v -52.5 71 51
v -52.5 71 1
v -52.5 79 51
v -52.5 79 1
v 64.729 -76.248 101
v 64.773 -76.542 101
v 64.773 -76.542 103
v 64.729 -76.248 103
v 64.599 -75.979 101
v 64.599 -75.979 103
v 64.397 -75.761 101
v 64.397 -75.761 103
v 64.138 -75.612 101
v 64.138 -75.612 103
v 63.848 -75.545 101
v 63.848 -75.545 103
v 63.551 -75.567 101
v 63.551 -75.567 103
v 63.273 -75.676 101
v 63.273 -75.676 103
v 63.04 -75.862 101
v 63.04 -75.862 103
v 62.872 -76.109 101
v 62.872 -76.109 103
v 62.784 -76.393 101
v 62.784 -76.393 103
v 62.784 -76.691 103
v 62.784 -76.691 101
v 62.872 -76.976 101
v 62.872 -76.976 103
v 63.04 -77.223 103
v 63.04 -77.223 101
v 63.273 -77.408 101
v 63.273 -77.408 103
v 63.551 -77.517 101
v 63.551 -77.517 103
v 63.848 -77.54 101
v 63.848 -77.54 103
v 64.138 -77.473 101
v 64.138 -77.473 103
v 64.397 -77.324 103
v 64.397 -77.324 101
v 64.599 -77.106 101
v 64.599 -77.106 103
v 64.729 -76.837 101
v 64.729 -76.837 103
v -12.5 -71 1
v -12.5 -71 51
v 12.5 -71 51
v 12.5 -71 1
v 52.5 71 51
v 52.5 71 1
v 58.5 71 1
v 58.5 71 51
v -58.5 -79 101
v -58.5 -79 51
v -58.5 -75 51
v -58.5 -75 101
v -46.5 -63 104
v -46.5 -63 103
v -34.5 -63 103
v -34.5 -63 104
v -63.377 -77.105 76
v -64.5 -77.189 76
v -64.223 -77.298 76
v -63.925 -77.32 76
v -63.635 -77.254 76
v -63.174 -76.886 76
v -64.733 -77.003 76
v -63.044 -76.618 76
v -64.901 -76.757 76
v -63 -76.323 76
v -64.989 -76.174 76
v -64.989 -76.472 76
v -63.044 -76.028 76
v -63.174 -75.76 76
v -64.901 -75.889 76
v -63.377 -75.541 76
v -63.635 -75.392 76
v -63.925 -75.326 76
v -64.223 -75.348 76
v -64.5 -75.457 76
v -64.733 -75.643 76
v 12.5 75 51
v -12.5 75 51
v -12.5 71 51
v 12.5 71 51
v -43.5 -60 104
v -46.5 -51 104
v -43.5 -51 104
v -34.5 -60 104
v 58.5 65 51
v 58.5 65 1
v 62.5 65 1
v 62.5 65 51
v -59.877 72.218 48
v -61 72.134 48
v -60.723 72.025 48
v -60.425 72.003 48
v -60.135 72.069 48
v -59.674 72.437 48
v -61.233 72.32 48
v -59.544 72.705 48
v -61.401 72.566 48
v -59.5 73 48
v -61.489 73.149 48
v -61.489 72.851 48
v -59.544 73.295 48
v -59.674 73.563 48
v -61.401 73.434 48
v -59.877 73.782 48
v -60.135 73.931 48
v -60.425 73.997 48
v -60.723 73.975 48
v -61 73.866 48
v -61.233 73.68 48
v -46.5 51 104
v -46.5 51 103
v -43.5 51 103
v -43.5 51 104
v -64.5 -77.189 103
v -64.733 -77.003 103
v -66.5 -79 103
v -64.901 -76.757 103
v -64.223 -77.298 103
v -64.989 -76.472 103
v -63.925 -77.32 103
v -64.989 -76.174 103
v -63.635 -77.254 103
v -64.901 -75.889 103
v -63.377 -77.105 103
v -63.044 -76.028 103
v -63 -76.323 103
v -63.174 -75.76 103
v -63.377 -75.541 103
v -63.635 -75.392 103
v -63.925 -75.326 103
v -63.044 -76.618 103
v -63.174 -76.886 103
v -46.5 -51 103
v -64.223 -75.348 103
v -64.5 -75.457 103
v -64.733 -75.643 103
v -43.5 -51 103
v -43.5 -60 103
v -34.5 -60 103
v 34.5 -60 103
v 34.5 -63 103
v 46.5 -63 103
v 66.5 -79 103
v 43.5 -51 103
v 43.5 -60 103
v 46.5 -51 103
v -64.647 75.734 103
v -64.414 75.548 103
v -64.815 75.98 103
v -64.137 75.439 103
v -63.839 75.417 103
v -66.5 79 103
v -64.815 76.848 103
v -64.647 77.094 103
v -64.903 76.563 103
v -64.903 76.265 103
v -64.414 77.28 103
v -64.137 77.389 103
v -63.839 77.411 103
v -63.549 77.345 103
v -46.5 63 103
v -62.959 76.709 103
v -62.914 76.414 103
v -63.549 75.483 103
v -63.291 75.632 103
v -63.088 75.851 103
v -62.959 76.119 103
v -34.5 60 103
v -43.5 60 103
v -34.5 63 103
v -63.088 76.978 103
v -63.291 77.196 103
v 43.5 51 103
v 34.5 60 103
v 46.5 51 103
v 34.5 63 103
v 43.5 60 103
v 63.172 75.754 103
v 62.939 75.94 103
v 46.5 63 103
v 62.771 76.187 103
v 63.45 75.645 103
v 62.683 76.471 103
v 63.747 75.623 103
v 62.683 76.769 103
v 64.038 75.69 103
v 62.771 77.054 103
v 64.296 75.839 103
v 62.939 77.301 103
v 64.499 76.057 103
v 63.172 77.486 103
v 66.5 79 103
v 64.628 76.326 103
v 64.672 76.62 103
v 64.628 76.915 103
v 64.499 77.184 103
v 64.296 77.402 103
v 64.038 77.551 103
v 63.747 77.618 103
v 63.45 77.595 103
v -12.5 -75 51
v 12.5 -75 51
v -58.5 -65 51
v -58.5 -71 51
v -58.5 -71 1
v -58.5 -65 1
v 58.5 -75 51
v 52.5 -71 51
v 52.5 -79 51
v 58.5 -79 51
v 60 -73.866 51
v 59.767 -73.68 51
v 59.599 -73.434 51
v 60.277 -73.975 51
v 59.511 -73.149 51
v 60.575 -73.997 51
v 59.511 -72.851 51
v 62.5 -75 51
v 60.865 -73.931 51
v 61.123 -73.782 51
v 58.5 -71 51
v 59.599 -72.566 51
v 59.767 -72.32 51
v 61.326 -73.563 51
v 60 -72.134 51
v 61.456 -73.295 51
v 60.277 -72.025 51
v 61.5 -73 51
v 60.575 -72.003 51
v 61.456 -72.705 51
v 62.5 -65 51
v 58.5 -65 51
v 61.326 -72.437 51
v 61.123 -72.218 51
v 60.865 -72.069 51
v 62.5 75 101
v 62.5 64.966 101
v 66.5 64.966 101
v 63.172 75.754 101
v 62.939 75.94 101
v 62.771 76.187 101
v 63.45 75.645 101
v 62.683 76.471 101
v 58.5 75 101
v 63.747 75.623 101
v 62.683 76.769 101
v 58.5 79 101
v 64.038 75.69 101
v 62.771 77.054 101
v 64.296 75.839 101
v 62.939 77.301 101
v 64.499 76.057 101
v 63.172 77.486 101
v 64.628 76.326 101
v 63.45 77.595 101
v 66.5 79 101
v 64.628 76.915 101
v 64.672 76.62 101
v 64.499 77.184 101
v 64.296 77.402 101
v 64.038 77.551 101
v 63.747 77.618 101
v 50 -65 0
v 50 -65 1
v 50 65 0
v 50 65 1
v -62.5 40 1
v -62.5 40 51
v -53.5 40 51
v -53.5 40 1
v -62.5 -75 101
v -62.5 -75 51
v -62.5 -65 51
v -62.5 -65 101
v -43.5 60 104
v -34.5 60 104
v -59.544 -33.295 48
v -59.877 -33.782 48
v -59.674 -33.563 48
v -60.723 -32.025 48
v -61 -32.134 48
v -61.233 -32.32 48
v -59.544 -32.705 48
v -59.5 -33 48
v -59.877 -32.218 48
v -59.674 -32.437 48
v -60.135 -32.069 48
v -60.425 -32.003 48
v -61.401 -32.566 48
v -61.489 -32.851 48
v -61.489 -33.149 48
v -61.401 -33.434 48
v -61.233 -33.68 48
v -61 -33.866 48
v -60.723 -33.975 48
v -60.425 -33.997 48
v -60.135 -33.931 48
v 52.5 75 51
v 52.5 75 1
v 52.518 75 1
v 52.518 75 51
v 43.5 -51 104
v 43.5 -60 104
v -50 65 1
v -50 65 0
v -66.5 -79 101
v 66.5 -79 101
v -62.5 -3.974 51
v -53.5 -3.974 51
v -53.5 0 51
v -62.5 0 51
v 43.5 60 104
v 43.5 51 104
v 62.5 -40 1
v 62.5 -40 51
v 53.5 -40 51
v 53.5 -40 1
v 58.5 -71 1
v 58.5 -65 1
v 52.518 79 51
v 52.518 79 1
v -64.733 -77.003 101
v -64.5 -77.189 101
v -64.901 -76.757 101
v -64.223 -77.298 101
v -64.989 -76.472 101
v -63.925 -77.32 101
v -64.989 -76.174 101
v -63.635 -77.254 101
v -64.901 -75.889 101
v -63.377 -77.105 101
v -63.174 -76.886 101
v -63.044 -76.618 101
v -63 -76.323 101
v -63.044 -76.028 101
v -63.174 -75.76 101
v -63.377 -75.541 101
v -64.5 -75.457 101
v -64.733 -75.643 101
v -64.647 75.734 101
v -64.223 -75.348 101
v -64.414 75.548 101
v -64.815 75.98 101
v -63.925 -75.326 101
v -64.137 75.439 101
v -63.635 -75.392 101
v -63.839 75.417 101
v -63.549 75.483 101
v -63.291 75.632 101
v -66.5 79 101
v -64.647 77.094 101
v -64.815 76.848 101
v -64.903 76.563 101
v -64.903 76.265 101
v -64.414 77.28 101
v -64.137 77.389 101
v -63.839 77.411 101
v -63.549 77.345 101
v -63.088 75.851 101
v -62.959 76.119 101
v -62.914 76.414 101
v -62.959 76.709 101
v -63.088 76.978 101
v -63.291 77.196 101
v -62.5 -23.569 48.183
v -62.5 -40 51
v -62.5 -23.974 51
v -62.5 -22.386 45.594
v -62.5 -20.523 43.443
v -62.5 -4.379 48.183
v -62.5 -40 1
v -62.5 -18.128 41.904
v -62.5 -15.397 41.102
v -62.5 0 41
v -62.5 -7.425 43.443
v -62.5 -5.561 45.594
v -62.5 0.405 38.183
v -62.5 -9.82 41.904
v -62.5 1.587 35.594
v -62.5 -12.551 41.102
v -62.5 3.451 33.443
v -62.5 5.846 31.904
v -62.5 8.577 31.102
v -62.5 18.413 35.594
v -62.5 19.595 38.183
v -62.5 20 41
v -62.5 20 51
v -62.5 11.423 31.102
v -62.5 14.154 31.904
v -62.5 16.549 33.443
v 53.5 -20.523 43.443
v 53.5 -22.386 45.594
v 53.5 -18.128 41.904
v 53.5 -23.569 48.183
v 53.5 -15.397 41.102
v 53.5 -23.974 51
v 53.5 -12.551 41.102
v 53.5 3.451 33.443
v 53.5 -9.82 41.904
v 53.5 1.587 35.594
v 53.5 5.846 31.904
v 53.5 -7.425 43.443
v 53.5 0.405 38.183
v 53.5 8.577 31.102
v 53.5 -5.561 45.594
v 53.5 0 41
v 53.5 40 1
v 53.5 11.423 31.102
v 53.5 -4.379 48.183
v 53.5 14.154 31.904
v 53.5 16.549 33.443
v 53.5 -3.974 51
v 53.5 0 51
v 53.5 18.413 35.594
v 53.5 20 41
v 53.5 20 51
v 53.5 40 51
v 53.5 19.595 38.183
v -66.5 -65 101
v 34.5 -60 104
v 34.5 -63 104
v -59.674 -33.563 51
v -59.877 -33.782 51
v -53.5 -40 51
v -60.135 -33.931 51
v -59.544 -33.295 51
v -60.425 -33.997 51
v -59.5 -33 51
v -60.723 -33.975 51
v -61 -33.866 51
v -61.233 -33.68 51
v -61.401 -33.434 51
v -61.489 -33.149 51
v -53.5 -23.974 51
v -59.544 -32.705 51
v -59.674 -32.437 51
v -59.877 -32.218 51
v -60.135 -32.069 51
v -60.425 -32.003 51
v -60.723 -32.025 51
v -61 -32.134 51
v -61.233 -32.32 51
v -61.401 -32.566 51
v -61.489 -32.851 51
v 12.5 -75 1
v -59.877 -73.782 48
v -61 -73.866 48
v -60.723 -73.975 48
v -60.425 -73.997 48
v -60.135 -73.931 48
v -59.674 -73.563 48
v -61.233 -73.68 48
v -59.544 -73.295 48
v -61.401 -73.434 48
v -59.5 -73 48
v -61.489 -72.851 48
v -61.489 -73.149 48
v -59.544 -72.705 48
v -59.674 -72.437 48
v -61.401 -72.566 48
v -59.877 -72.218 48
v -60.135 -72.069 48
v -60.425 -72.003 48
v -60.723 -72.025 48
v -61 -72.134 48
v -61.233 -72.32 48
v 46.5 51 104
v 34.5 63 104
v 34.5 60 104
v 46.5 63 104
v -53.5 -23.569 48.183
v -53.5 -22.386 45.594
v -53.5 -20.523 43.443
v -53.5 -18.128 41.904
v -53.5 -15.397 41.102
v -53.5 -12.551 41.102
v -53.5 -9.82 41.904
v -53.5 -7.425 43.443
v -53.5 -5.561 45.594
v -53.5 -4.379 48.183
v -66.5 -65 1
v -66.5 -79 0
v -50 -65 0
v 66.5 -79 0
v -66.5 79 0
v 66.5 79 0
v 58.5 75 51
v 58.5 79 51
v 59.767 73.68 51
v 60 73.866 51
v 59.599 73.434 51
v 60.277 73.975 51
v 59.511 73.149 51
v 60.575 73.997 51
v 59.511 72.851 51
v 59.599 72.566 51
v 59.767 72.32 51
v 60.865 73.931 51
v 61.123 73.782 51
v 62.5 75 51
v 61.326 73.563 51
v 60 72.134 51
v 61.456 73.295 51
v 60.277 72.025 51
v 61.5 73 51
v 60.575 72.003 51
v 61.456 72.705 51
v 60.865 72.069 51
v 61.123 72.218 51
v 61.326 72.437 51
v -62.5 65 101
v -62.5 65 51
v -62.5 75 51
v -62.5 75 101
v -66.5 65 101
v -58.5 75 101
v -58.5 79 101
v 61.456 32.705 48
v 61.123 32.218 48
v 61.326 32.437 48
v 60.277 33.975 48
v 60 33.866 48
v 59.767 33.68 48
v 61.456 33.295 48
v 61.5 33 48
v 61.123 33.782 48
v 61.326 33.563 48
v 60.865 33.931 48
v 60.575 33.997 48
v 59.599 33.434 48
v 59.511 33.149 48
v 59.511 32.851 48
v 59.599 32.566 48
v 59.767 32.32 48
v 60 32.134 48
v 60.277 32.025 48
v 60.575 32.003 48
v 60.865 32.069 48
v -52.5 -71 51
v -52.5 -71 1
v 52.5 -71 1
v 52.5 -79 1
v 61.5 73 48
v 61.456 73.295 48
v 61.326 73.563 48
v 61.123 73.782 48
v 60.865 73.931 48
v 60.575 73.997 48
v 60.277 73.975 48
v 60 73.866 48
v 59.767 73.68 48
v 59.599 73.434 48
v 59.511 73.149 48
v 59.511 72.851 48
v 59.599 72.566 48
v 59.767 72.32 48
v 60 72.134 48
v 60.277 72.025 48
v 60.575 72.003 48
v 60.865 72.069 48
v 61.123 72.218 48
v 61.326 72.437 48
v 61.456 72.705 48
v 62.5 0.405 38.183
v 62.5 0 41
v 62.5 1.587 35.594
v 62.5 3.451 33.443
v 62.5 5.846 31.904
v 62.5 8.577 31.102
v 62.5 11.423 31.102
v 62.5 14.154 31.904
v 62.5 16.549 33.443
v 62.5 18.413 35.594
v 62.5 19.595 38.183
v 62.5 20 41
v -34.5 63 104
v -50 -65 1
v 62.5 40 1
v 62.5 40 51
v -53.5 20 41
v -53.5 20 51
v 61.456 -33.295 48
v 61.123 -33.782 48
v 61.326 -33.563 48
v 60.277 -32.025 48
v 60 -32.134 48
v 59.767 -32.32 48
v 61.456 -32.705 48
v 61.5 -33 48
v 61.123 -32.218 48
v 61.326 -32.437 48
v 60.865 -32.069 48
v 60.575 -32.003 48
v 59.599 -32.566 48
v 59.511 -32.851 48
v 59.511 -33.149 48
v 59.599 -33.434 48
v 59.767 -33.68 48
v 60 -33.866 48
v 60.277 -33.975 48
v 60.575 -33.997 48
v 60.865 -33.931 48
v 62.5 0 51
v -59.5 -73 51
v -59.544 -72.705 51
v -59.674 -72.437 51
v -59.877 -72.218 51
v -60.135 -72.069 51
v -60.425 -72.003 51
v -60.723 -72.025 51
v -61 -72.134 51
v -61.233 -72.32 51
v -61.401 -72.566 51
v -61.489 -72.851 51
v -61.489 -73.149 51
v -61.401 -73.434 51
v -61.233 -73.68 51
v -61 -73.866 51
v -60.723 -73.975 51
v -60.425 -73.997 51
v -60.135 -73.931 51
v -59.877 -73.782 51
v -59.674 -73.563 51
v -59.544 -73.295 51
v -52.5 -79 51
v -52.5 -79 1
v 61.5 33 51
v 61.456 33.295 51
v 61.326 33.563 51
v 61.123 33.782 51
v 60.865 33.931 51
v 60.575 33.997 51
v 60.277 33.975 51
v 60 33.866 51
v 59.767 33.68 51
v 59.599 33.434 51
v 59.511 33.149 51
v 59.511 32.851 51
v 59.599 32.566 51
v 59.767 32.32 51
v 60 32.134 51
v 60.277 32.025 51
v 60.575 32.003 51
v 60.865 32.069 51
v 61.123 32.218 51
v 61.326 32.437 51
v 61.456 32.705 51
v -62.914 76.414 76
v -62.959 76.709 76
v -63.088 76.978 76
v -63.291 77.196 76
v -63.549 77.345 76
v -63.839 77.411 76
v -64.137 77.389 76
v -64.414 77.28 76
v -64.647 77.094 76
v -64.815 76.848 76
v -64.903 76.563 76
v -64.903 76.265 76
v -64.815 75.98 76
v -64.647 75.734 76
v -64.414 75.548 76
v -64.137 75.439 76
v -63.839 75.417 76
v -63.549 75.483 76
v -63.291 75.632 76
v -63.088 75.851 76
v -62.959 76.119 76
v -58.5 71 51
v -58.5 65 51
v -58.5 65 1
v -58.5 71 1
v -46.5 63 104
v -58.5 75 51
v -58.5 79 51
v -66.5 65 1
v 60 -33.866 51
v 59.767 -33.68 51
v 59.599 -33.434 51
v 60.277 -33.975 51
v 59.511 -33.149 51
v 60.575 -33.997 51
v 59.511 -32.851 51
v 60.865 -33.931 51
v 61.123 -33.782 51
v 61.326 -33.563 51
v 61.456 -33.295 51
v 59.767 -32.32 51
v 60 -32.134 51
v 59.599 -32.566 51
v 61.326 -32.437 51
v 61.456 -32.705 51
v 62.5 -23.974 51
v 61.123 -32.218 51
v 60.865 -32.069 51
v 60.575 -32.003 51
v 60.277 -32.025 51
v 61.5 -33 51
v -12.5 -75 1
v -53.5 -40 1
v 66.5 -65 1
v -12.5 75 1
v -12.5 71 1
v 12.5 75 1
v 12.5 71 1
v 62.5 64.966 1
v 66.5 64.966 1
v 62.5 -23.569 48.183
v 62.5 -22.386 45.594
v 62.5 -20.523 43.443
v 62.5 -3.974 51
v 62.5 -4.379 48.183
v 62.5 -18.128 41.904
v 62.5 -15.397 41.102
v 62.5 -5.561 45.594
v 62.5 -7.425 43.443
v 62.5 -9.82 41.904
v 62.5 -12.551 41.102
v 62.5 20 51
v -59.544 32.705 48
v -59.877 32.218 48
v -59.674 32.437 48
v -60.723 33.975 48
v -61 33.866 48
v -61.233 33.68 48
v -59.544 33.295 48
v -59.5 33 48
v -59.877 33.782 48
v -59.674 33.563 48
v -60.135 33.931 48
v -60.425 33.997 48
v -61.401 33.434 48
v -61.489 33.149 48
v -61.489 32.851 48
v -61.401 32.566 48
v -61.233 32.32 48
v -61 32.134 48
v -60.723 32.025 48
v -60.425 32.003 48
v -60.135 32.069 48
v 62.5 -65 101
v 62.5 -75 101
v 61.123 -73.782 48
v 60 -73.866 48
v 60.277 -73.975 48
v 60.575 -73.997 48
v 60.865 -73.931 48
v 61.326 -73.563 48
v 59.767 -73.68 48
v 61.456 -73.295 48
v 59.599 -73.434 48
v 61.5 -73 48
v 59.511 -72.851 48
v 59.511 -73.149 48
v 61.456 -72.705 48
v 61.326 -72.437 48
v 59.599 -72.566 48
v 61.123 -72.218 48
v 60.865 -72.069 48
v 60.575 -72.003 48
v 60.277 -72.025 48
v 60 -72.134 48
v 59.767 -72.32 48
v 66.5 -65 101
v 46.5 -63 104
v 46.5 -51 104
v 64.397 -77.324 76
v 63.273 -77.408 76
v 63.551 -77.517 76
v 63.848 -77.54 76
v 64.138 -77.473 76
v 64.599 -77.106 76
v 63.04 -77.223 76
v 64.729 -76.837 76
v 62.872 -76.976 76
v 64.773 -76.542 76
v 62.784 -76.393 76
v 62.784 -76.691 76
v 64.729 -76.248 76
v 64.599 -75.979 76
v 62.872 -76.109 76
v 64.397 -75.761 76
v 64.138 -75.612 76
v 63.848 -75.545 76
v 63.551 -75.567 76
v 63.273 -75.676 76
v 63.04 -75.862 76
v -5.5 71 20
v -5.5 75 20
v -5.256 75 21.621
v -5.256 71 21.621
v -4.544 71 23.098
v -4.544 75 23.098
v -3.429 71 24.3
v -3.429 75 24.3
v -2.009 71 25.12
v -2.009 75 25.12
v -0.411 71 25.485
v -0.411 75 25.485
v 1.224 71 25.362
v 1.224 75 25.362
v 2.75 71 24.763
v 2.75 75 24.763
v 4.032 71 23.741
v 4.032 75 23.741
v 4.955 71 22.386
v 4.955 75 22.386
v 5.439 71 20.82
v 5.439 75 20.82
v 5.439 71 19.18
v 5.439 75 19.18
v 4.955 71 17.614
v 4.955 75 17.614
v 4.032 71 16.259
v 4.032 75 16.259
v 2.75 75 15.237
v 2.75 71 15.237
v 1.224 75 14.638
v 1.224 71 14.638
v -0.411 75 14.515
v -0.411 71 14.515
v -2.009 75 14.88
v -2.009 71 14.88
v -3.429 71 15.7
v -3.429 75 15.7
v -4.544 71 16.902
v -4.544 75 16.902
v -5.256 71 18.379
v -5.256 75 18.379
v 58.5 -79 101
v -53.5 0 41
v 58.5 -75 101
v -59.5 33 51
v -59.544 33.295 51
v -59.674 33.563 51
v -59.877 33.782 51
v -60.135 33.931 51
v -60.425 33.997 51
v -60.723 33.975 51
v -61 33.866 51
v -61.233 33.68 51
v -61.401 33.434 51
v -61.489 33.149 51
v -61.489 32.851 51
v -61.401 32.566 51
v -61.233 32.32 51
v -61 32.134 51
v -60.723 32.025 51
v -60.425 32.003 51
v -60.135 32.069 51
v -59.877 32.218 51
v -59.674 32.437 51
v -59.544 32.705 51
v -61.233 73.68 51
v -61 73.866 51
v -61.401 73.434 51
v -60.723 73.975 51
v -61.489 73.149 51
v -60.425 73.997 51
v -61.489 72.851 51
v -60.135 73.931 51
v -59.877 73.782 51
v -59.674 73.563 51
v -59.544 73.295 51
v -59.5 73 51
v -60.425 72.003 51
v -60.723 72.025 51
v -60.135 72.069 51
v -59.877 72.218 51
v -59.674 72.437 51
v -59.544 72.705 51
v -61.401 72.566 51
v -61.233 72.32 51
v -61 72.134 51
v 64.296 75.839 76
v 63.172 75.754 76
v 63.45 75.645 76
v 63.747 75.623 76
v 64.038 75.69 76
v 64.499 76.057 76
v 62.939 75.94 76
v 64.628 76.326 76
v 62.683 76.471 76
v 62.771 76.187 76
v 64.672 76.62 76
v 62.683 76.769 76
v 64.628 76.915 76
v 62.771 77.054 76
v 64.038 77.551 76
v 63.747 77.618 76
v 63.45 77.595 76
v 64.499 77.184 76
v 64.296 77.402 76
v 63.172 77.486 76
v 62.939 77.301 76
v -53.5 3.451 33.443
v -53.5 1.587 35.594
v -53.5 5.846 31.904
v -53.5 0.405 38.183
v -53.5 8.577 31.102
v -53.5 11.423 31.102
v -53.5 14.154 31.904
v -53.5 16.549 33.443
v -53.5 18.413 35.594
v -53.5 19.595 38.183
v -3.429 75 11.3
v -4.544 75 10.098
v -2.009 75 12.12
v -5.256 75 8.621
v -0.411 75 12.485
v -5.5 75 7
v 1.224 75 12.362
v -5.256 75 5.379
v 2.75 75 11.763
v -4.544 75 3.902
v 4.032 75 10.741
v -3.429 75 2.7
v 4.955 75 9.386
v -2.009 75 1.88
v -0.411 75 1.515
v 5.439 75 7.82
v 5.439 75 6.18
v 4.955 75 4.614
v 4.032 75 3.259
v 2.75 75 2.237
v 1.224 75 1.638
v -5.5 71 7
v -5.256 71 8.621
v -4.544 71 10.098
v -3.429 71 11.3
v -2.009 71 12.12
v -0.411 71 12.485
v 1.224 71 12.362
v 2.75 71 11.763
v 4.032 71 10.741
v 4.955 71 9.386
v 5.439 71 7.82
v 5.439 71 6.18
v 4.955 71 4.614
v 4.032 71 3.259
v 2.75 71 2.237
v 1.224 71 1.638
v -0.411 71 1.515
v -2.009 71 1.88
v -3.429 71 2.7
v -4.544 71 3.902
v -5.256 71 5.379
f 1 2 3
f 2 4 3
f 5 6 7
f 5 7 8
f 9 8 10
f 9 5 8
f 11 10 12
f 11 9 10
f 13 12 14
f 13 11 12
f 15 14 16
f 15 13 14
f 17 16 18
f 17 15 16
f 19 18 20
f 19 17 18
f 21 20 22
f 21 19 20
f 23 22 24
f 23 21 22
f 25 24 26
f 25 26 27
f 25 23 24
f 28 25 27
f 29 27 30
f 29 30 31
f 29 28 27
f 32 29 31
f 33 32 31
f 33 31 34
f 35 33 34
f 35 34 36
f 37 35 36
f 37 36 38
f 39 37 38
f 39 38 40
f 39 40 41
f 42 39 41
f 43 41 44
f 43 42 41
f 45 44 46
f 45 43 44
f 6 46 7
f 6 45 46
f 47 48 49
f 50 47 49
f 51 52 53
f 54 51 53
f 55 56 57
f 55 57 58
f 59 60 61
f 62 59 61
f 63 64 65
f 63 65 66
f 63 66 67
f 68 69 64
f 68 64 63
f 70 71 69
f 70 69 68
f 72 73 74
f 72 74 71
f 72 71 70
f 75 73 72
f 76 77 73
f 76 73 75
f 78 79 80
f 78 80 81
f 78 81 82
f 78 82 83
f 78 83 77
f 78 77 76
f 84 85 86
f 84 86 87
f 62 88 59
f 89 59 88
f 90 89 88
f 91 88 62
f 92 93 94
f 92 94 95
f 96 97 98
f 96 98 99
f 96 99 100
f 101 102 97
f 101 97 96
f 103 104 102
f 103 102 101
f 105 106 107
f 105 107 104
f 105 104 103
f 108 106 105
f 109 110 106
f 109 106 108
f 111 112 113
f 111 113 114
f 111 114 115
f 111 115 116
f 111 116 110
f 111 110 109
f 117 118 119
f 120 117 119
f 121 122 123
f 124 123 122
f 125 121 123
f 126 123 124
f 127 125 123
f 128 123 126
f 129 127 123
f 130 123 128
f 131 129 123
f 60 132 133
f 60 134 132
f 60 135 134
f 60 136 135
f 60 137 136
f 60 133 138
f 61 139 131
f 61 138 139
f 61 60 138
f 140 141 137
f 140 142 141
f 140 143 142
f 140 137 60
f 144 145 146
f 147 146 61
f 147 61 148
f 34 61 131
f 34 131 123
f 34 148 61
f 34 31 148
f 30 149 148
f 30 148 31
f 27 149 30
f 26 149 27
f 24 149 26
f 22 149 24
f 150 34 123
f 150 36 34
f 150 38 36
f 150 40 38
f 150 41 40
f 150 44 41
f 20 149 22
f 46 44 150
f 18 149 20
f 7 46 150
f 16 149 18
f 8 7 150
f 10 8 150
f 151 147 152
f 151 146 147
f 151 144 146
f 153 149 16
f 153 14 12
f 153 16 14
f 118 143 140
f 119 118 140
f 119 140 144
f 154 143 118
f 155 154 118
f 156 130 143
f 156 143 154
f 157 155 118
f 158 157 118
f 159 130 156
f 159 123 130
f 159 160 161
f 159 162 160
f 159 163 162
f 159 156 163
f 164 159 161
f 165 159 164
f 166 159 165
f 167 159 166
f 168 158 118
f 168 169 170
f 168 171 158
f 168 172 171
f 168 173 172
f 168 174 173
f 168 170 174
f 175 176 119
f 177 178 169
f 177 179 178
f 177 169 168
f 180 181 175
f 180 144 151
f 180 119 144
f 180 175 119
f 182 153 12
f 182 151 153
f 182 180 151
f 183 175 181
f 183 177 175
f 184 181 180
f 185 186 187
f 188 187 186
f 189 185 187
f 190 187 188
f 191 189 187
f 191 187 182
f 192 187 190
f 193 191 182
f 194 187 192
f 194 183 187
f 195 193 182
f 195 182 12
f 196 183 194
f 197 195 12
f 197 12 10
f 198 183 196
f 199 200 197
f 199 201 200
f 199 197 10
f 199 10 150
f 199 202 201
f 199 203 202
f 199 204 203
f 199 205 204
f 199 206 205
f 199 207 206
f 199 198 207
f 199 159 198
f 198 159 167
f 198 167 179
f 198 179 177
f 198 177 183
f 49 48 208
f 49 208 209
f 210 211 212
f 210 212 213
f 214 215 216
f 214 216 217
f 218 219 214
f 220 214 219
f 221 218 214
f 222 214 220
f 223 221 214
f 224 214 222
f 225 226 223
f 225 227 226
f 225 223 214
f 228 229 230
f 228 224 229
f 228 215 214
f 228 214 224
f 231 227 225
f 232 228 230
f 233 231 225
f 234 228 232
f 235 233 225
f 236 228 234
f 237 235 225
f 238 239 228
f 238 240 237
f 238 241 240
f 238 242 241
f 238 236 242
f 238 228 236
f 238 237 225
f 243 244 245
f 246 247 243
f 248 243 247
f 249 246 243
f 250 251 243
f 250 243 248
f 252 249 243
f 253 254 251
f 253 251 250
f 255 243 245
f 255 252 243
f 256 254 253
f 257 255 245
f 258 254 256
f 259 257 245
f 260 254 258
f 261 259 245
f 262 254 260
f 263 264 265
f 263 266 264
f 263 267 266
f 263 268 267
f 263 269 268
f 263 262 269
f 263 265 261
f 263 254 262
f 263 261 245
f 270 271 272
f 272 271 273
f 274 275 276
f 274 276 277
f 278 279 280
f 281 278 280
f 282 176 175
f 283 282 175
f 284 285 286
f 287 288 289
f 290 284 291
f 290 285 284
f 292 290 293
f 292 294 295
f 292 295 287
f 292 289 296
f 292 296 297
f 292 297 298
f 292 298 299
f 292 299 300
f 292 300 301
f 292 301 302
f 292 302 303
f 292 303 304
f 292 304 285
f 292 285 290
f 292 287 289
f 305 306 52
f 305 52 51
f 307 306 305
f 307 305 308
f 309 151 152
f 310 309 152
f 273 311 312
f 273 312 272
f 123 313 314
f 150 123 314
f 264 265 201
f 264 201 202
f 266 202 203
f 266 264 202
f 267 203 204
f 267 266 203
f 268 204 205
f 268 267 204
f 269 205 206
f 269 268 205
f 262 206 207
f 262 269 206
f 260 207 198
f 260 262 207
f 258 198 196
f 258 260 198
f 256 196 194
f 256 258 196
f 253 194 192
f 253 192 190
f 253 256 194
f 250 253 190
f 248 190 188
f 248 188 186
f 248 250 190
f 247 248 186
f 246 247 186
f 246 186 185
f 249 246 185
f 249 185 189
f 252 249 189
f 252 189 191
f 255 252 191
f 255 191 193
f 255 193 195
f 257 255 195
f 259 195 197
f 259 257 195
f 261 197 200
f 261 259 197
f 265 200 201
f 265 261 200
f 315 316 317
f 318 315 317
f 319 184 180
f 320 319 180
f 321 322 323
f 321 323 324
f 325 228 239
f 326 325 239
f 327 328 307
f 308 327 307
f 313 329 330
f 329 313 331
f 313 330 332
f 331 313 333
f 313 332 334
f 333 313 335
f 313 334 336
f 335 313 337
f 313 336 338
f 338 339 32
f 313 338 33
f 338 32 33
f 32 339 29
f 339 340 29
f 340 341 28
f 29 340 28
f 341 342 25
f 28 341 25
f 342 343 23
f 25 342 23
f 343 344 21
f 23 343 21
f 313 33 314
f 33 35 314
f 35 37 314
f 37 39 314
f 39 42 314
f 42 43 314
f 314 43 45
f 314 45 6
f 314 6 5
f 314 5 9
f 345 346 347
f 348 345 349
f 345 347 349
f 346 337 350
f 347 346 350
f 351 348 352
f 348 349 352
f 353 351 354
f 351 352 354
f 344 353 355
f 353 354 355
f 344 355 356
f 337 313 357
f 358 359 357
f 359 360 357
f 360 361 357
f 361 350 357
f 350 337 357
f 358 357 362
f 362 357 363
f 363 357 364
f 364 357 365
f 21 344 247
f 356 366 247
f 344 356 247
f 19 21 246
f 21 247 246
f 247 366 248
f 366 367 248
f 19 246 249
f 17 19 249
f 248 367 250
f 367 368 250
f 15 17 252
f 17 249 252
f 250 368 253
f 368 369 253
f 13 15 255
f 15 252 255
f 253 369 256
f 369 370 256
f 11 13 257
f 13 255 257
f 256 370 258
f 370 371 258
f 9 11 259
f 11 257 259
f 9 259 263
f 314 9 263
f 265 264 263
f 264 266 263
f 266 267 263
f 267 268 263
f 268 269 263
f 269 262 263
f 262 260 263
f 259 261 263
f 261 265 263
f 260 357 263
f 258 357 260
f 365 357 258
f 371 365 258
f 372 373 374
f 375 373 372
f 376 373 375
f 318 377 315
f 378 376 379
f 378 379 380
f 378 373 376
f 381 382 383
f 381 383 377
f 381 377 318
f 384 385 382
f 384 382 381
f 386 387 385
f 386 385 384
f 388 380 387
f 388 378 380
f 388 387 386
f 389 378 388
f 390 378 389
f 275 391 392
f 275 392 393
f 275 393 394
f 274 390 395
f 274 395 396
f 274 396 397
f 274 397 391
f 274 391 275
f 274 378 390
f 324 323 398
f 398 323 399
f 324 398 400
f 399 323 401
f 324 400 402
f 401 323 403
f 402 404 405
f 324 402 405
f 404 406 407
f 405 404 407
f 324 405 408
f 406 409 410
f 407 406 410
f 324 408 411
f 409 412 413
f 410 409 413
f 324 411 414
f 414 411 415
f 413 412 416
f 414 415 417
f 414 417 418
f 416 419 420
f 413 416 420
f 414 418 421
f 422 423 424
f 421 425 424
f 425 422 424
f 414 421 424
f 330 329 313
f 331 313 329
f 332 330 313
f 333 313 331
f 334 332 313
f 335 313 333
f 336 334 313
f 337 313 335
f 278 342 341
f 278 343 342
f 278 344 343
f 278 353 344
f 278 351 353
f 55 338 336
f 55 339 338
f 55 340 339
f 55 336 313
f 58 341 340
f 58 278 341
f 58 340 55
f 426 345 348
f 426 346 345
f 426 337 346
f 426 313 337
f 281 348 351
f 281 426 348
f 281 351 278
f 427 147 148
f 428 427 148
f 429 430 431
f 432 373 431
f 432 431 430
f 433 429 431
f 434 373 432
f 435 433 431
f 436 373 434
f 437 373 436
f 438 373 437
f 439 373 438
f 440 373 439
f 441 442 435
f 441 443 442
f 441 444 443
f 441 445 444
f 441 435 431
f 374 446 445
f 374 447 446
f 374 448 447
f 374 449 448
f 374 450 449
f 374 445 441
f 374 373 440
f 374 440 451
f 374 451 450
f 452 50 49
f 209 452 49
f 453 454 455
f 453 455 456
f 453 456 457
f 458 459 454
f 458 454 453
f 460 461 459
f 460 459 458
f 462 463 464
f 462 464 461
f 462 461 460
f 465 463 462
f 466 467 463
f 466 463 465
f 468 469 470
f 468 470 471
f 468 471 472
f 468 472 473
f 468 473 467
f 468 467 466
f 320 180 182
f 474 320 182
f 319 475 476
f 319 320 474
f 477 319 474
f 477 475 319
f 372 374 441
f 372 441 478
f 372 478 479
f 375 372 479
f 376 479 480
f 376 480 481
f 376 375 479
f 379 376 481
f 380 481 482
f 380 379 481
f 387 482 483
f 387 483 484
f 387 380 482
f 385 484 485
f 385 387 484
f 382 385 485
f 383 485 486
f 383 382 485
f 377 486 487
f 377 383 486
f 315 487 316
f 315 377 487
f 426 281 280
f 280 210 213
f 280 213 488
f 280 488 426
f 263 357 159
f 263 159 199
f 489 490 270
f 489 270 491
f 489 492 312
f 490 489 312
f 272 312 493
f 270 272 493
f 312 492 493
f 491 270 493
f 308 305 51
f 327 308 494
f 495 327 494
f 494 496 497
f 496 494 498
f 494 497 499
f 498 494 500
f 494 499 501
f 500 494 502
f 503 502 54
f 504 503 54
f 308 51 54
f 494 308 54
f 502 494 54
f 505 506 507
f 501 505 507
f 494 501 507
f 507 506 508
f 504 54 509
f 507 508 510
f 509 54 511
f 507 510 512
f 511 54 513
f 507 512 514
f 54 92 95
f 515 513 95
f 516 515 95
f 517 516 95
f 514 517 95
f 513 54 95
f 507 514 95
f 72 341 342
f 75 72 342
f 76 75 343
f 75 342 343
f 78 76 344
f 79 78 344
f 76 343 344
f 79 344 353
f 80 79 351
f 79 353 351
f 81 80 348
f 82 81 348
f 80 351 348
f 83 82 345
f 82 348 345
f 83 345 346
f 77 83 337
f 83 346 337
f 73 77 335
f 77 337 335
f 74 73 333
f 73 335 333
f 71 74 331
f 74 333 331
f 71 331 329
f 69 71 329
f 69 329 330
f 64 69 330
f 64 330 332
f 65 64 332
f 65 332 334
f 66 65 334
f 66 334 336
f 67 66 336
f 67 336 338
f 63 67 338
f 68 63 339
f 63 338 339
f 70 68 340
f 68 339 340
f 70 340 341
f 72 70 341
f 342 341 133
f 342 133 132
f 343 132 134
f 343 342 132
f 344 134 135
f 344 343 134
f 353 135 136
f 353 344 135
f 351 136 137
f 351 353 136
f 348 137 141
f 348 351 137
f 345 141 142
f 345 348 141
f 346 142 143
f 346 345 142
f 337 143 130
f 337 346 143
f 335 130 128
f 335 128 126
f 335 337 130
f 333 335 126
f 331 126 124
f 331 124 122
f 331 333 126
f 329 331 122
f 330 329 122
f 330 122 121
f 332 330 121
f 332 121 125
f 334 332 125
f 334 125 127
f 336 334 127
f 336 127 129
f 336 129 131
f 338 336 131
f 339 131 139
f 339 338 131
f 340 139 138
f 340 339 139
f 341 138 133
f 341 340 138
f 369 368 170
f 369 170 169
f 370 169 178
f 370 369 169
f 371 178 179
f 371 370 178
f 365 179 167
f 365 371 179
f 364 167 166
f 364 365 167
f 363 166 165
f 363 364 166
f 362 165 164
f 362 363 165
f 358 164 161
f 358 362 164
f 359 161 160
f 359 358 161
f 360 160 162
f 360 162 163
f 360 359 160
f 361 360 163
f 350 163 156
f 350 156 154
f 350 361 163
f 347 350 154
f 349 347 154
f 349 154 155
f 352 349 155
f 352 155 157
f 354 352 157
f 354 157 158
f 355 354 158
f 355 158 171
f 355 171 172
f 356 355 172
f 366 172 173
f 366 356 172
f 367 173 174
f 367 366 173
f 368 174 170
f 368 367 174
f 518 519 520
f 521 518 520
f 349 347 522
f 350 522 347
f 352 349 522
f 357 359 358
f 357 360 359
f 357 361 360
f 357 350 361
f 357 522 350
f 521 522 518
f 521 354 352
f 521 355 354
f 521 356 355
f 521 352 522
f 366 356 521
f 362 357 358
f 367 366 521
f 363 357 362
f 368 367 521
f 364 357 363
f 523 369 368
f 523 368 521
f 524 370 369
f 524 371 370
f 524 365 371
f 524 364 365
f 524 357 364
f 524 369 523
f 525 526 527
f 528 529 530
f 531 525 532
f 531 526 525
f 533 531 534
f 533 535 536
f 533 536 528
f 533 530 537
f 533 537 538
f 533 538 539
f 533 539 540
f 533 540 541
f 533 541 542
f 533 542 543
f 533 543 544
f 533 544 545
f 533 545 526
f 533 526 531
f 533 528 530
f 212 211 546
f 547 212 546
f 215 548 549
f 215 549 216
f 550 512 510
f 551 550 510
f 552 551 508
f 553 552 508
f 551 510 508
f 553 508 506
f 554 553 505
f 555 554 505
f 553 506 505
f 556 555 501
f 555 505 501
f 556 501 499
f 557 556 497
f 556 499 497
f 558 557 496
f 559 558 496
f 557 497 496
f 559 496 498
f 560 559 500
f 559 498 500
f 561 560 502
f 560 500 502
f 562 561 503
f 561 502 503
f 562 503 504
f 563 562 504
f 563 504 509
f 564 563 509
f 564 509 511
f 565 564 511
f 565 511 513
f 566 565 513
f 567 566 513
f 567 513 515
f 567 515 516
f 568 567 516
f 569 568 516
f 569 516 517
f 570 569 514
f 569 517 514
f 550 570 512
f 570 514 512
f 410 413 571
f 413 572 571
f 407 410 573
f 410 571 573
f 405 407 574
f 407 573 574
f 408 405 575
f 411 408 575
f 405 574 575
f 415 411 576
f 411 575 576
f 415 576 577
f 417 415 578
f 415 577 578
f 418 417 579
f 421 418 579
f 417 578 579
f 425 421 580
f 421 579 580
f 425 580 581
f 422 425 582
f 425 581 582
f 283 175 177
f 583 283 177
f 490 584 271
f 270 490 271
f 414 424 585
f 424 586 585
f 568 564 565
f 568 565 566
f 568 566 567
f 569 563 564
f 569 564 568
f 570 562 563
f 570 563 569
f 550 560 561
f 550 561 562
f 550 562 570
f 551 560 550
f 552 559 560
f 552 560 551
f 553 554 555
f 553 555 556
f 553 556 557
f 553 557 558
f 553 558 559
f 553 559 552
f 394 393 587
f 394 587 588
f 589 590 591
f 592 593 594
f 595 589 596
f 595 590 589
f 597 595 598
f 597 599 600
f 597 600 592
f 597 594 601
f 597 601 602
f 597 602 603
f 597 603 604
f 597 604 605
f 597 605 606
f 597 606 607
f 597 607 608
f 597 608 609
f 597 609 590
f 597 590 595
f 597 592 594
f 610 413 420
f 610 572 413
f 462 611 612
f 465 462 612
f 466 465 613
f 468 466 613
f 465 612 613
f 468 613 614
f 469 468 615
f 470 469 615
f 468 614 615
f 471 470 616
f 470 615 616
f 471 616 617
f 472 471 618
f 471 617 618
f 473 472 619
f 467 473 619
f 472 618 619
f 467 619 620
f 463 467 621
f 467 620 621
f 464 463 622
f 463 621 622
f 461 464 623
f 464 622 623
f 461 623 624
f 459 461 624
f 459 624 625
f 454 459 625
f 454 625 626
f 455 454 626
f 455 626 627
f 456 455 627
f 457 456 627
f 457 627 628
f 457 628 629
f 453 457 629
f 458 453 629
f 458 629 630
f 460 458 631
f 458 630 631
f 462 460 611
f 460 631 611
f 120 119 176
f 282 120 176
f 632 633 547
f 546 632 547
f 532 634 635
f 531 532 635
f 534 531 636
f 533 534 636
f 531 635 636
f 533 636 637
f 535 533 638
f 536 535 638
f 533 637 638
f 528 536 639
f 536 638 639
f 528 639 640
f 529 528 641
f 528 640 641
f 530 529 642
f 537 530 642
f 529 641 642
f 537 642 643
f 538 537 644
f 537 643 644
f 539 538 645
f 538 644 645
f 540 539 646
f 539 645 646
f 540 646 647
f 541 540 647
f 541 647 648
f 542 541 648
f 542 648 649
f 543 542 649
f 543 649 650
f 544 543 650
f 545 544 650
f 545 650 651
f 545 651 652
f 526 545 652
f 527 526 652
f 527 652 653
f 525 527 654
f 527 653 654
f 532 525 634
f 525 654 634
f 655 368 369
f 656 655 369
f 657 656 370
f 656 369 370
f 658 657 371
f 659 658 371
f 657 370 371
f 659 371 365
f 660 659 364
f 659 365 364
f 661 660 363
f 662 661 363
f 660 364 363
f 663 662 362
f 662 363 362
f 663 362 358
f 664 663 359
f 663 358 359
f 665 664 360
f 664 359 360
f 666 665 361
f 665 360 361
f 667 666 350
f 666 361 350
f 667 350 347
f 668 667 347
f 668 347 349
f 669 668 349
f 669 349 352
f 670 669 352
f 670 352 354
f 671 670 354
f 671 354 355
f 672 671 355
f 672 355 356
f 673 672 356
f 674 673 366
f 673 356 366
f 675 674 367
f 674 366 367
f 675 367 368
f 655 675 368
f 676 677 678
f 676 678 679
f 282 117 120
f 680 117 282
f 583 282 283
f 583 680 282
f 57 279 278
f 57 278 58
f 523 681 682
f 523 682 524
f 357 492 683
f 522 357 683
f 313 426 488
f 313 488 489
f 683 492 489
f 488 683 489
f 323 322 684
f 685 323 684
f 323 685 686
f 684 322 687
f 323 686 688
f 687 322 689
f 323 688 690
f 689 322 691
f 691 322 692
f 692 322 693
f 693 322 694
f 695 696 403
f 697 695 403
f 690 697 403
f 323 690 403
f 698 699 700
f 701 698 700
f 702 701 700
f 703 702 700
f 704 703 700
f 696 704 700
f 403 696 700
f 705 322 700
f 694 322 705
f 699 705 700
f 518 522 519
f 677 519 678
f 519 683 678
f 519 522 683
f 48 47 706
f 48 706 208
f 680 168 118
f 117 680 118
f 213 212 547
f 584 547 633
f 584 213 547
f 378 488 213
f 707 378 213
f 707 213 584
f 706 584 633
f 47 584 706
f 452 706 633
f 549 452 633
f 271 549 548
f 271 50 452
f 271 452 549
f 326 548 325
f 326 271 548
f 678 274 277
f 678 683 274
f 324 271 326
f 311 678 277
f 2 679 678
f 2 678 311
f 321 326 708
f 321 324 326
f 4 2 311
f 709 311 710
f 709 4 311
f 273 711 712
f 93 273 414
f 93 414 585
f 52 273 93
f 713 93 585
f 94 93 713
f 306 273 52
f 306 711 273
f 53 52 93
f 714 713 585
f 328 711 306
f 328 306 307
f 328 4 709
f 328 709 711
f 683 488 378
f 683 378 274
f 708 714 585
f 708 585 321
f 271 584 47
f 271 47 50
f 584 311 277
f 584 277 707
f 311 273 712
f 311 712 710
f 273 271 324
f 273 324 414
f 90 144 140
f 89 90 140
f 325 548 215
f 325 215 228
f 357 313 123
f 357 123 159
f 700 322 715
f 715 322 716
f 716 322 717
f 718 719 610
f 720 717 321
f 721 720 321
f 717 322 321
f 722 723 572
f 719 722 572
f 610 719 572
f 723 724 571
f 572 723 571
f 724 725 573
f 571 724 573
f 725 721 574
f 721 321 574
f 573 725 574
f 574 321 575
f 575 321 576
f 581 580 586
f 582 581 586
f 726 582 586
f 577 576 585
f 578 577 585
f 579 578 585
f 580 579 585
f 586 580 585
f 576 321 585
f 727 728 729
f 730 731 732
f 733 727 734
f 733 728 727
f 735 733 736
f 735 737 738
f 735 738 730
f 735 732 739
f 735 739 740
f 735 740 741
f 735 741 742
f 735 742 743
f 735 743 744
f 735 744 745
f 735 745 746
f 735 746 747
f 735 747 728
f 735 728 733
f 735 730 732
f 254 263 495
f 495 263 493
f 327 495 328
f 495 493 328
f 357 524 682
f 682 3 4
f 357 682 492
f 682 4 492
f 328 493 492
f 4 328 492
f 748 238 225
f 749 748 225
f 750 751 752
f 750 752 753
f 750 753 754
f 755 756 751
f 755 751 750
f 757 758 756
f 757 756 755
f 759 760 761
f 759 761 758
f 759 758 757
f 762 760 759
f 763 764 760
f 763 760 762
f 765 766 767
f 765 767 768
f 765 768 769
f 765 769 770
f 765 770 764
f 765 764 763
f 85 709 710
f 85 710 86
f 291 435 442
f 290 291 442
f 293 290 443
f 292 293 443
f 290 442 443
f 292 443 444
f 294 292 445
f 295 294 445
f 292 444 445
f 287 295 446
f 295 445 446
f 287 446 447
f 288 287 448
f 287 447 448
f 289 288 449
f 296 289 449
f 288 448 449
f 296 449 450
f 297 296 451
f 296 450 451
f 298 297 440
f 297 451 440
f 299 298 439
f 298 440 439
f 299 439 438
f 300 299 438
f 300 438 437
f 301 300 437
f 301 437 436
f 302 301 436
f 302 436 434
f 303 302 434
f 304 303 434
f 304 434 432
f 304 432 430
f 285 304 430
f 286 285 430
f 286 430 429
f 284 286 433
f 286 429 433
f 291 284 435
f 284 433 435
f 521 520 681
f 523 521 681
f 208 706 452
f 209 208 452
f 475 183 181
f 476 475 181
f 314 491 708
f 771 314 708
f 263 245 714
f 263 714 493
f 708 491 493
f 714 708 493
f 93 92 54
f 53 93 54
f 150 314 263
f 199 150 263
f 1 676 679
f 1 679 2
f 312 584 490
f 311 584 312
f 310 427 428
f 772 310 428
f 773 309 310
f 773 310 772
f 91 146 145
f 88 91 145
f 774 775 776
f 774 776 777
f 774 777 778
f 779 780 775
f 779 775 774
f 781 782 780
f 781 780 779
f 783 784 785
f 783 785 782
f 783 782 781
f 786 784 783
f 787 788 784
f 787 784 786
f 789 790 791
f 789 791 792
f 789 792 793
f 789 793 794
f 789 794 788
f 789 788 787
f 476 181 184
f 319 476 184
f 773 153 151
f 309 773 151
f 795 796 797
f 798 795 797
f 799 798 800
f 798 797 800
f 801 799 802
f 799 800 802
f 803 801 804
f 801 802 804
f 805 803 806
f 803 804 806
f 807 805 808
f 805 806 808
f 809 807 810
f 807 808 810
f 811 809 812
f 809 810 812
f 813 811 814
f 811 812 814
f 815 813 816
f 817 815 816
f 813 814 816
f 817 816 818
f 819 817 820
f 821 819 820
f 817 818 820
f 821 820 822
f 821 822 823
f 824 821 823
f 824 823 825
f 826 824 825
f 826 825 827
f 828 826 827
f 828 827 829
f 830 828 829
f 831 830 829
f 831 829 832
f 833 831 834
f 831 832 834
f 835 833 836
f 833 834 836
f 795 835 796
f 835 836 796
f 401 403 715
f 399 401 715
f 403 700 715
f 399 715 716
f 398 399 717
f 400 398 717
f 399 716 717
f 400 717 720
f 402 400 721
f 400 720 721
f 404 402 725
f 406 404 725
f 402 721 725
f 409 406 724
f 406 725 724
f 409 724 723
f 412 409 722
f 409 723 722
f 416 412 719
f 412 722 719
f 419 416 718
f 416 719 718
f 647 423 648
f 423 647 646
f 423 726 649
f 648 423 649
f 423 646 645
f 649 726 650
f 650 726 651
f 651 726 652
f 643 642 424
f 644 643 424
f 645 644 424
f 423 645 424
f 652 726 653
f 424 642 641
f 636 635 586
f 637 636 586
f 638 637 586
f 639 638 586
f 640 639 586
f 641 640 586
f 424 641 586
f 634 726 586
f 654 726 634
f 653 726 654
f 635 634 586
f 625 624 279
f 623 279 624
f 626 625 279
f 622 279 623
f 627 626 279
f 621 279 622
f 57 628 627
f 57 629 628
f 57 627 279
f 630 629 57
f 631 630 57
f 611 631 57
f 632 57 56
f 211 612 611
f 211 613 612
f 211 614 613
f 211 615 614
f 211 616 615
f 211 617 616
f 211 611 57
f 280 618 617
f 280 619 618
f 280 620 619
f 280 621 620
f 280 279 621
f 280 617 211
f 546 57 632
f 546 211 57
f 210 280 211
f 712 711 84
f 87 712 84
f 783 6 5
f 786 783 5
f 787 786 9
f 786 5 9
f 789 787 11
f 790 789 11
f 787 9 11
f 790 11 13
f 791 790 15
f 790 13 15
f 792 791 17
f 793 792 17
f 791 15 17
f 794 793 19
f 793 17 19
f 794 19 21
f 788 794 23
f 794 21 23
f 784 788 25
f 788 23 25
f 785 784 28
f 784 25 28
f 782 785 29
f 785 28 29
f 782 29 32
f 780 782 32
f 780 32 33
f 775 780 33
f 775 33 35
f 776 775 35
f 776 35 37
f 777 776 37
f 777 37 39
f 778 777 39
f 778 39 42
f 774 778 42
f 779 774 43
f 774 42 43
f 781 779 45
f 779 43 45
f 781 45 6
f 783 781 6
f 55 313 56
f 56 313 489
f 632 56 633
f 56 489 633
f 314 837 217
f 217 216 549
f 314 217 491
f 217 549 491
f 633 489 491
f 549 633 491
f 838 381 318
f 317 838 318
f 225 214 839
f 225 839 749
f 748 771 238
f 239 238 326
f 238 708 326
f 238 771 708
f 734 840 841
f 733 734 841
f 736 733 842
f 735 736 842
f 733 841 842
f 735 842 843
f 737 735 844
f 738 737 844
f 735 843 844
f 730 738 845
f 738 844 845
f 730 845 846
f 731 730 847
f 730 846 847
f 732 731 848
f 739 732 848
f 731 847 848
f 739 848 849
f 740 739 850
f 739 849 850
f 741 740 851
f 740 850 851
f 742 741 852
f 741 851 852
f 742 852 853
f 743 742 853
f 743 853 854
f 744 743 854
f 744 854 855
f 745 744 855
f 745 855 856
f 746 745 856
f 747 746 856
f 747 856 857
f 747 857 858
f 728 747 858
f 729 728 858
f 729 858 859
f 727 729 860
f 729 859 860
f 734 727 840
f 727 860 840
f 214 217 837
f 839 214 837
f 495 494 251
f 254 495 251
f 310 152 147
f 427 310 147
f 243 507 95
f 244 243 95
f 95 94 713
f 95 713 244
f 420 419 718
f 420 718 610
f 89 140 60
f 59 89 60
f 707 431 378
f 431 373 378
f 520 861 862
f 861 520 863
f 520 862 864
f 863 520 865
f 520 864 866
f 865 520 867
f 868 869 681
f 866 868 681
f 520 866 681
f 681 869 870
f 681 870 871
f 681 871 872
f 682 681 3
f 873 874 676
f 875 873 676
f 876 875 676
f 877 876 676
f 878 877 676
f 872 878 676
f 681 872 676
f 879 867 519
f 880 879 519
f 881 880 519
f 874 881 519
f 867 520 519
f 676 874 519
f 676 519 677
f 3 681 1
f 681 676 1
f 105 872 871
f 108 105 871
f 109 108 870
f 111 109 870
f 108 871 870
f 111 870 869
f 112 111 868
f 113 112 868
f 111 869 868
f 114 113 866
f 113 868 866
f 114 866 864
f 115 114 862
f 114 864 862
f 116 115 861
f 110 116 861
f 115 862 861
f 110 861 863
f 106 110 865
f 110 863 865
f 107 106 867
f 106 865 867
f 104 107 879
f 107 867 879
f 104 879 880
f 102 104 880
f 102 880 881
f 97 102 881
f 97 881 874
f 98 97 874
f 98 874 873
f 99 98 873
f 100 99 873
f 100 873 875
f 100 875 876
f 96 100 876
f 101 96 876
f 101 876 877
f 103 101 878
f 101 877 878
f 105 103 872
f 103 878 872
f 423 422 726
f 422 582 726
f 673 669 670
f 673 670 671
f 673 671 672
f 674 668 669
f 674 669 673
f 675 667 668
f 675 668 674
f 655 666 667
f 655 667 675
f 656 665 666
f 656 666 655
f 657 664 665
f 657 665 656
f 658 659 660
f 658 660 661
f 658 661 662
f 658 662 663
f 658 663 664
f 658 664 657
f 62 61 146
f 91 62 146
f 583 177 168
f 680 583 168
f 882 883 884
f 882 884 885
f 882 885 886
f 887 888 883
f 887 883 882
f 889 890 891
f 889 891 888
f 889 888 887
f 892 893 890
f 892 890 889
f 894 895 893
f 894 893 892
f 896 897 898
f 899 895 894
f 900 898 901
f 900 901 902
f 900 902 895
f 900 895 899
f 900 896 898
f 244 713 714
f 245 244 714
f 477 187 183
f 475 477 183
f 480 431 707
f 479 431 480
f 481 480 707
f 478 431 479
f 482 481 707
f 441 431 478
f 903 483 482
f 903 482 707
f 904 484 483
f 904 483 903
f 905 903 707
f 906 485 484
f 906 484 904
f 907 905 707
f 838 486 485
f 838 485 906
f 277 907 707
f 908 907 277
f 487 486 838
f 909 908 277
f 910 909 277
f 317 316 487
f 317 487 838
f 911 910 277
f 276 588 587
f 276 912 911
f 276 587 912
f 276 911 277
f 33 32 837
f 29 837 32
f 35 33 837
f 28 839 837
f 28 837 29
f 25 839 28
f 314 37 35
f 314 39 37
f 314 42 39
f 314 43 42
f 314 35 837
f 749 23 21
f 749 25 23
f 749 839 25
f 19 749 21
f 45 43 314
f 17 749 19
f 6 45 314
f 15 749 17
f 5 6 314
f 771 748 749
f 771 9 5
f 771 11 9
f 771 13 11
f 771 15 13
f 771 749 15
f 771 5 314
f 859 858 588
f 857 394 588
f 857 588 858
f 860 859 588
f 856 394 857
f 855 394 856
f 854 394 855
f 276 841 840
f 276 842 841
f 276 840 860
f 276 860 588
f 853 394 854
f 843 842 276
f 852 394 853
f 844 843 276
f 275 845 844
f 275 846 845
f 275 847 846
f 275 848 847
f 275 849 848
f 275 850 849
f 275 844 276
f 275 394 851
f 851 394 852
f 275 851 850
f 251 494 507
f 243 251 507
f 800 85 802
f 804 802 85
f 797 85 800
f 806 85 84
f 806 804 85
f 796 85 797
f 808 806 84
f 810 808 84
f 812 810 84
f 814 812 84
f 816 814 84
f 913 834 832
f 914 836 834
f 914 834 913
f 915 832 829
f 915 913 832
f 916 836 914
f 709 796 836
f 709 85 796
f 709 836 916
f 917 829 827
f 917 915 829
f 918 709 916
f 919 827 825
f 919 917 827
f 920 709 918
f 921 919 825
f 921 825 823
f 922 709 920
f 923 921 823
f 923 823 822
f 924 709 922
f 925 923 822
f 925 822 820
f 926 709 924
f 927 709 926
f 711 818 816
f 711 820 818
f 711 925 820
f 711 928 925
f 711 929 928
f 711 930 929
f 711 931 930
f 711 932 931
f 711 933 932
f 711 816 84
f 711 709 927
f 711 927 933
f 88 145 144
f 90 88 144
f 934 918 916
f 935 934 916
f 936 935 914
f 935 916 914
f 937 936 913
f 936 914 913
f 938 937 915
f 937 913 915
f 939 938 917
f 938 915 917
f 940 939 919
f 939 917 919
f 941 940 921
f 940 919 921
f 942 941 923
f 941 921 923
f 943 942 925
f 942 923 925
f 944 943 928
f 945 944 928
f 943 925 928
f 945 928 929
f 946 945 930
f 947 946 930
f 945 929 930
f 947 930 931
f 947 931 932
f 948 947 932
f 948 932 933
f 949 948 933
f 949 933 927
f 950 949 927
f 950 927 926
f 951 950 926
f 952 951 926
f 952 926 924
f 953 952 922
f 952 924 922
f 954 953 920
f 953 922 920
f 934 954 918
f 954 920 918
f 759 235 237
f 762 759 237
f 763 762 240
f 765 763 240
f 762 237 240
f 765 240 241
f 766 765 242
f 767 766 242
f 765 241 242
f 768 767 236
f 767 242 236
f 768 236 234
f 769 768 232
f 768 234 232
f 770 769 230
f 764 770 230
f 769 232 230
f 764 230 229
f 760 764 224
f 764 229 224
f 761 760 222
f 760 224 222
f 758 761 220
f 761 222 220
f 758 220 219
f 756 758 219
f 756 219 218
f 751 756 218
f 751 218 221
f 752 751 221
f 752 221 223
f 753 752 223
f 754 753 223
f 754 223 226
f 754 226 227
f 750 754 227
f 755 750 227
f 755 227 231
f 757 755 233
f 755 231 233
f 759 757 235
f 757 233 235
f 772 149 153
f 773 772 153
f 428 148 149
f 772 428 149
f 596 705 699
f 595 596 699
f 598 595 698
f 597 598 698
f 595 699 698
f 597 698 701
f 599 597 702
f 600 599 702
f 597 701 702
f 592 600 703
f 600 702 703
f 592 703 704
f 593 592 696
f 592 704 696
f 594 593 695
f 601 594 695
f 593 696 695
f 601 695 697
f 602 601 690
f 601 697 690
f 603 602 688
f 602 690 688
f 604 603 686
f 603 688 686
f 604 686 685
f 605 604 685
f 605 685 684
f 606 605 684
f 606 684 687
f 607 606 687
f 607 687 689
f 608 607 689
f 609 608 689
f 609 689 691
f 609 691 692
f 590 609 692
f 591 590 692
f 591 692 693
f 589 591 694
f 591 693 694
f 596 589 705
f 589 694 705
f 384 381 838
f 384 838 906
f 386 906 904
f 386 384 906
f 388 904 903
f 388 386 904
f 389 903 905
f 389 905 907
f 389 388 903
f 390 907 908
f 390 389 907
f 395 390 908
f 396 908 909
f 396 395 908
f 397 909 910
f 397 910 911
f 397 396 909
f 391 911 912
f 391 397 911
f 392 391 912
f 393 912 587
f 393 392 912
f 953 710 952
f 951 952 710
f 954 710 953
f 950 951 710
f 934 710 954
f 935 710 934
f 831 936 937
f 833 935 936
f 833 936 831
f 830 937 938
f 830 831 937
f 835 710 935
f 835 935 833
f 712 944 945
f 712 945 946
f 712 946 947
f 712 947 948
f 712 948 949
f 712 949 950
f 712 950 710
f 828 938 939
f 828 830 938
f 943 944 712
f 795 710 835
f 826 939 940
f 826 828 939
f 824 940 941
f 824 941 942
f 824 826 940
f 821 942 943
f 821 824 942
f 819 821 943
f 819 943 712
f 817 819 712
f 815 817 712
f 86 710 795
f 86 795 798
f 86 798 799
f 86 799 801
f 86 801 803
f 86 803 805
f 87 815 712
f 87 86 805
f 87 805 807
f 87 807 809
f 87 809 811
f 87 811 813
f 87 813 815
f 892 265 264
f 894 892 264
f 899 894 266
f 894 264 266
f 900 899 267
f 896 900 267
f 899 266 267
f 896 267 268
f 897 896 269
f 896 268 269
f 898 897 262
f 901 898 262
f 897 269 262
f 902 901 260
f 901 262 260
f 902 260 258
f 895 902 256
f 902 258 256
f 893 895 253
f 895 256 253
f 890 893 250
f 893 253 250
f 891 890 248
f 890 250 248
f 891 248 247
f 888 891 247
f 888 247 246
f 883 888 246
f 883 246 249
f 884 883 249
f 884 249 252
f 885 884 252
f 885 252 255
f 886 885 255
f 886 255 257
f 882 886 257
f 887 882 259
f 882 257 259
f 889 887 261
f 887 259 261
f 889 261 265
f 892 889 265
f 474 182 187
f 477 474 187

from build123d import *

# Parameters (mm, degrees)
F1_DEPTH  = 1
F2_W      = 125
F2_H      = 150
F3_DEPTH  = 50
F4_W      = 117
F4_H      = 142
F5_DEPTH  = 50
F6_R      = 1
F7_DEPTH  = 3
F8_W      = 20
F8_H      = 10
F10_DEPTH = 129.001
F11_DEPTH = 129.001
F13_DEPTH = 129.001
F14_R     = 5.5
F15_DEPTH = 4
F16_W     = 40
F16_H     = 50
F17_DEPTH = 154.001
F18_W     = 25
F18_H     = 50
F19_DEPTH = 129.001
F20_W     = 10
F20_H     = 4
F20_W_2   = 4
F20_H_2   = 10
F21_DEPTH = 100
F22_R     = 1
F23_DEPTH = 25
F24_DEPTH = 5
F25_DEPTH = 5
F26_W     = 100
F26_H     = 130
F27_DEPTH = 1.001
F28_W     = 6
F28_H     = 50
F29_DEPTH = 158.001
F31_W     = 133
F31_H     = 158
F31_R     = 1
F32_DEPTH = 2
F33_DEPTH = 3


with BuildPart() as f1:
    # F0 (on Top) → F1 (new body)
    with BuildSketch(Plane.XY):
        Polygon((-62.5, 79), (-66.5, 79), (-66.5, -79), (66.5, -79), (66.5, 79), align=None)
    extrude(amount=F1_DEPTH)

    # F2 (on face) → F3 (join)
    with BuildSketch(Plane.XY.offset(1)):
        Rectangle(F2_W, F2_H)
    extrude(amount=F3_DEPTH)

    # F4 (on face) → F5 (cut)
    with BuildSketch(Plane.XY.offset(51)):
        Rectangle(F4_W, F4_H)
    extrude(amount=-F5_DEPTH, mode=Mode.SUBTRACT)

    # F6 (on face) → F7 (cut)
    with BuildSketch(Plane.XY.offset(51)):
        with Locations((-60.5, 73)):
            Circle(F6_R)
        with Locations((60.5, 73)):
            Circle(F6_R)
        with Locations((60.5, 33)):
            Circle(F6_R)
        with Locations((60.5, -33)):
            Circle(F6_R)
        with Locations((60.5, -73)):
            Circle(F6_R)
        with Locations((-60.5, -73)):
            Circle(F6_R)
        with Locations((-60.5, -33)):
            Circle(F6_R)
        with Locations((-60.5, 33)):
            Circle(F6_R)
    extrude(amount=-F7_DEPTH, mode=Mode.SUBTRACT)

    # F8 (on face) → F10 (cut, through all)
    with BuildSketch(Plane.YZ.offset(62.5)):
        with Locations((10, 46)):
            Rectangle(F8_W, F8_H)
    extrude(amount=-F10_DEPTH, mode=Mode.SUBTRACT)

    # F9 (on face) → F11 (cut, through all)
    with BuildSketch(Plane.YZ.offset(62.5)):
        with BuildLine():
            ThreePointArc((10.0000000862, 51), (2.9289321577, 33.9289322186), (20, 41))
            ThreePointArc((20, 41), (17.0710678423, 48.0710677814), (10.0000000862, 51))
        make_face()
    extrude(amount=-F11_DEPTH, mode=Mode.SUBTRACT)

    # F12 (on face) → F13 (cut, through all)
    with BuildSketch(Plane.YZ.offset(62.5)):
        with BuildLine():
            ThreePointArc((-23.9739569277, 51), (-13.9739569277, 41), (-3.9739569277, 51))
            Line((-3.9739569277, 51), (-23.9739569277, 51))
        make_face()
    extrude(amount=-F13_DEPTH, mode=Mode.SUBTRACT)

    # F14 (on face) → F15 (cut)
    with BuildSketch(Plane(origin=(0, 75, 0), x_dir=(-1, 0, 0), z_dir=(0, 1, 0))):
        with Locations((0, 20)):
            Circle(F14_R)
        with Locations((0, 7)):
            Circle(F14_R)
    extrude(amount=-F15_DEPTH, mode=Mode.SUBTRACT)

    # F16 (on face) → F17 (cut, through all)
    with BuildSketch(Plane(origin=(0, 75, 0), x_dir=(-1, 0, 0), z_dir=(0, 1, 0))):
        with Locations((-32.5, 26)):
            Rectangle(F16_W, F16_H)
        with Locations((32.5, 26)):
            Rectangle(F16_W, F16_H)
    extrude(amount=-F17_DEPTH, mode=Mode.SUBTRACT)

    # F18 (on face) → F19 (cut, through all)
    with BuildSketch(Plane(origin=(-62.5, 0, 0), x_dir=(0, -1, 0), z_dir=(-1, 0, 0))):
        with Locations((-52.5, 26)):
            Rectangle(F18_W, F18_H)
        with Locations((52.5, 26)):
            Rectangle(F18_W, F18_H)
    extrude(amount=-F19_DEPTH, mode=Mode.SUBTRACT)

    # F20 (on face) → F21 (join)
    with BuildSketch(Plane.XY.offset(1)):
        Polygon((-62.5, -65), (-66.5, -65), (-66.5, -79), (-62.5, -79), (-62.5, -75), align=None)
        with Locations((-57.5, -77)):
            Rectangle(F20_W, F20_H)
        with Locations((57.5, -77)):
            Rectangle(F20_W, F20_H)
        Polygon((66.5, -79), (66.5, -65), (62.5, -65), (62.5, -75), (62.5, -79), align=None)
        Polygon((-52.5, 79), (-66.5, 79), (-66.5, 75), (-62.5, 75), (-52.5, 75), align=None)
        with Locations((-64.5, 70)):
            Rectangle(F20_W_2, F20_H_2)
        Polygon((66.5, 79), (52.5175742805, 79), (52.5175742805, 75), (62.5, 75), (66.5, 75), align=None)
        Polygon((66.5, 64.9660155177), (66.5, 75), (62.5, 75), (62.5, 65), (62.5, 64.9660155177), align=None)
    extrude(amount=F21_DEPTH)

    # F22 (on face) → F23 (cut)
    with BuildSketch(Plane.XY.offset(101)):
        with Locations((-63.9142135624, 76.4142135624)):
            Circle(F22_R)
        with Locations((63.6722929489, 76.6204102079)):
            Circle(F22_R)
        with Locations((63.7731581912, -76.5424228409)):
            Circle(F22_R)
        with Locations((-64, -76.3228756555)):
            Circle(F22_R)
    extrude(amount=-F23_DEPTH, mode=Mode.SUBTRACT)

    # F24 (add): a face of the model
    f24_faces = [f1.faces().sort_by_distance(p)[0] for p in [
        (58.5, -0.3946744588, 23.4325126547),
    ]]
    extrude(f24_faces, amount=F24_DEPTH)

    # F25 (add): a face of the model
    f25_faces = [f1.faces().sort_by_distance(p)[0] for p in [
        (-58.5, -0.3946744588, 23.4325126547),
    ]]
    extrude(f25_faces, amount=F25_DEPTH)

    # F26 (on face) → F27 (cut, through all)
    with BuildSketch(Plane.XY.offset(1)):
        Rectangle(F26_W, F26_H)
    extrude(amount=-F27_DEPTH, mode=Mode.SUBTRACT)

    # F28 (on face) → F29 (cut, through all)
    with BuildSketch(Plane.XZ.offset(79)):
        with Locations((-55.5, 76)):
            Rectangle(F28_W, F28_H)
        with Locations((55.5, 76)):
            Rectangle(F28_W, F28_H)
    extrude(amount=-F29_DEPTH, mode=Mode.SUBTRACT)


with BuildPart() as f32:
    # F31 (on offset) → F32 (new body)
    with BuildSketch(Plane.XY.offset(101)):
        Rectangle(F31_W, F31_H)
        with Locations((-64, -76.3228756555)):
            Circle(F31_R, mode=Mode.SUBTRACT)
        Polygon((-34.5, -60), (-34.5, -63), (-46.5, -63), (-46.5, -51), (-43.5, -51), (-43.5, -60), align=None, mode=Mode.SUBTRACT)
        with Locations((63.7731581912, -76.5424228409)):
            Circle(F31_R, mode=Mode.SUBTRACT)
        Polygon((43.5, -60), (43.5, -51), (46.5, -51), (46.5, -63), (34.5, -63), (34.5, -60), align=None, mode=Mode.SUBTRACT)
        Polygon((-43.5, 60), (-43.5, 51), (-46.5, 51), (-46.5, 63), (-34.5, 63), (-34.5, 60), align=None, mode=Mode.SUBTRACT)
        with Locations((-63.9142135624, 76.4142135624)):
            Circle(F31_R, mode=Mode.SUBTRACT)
        Polygon((34.5, 63), (46.5, 63), (46.5, 51), (43.5, 51), (43.5, 60), (34.5, 60), align=None, mode=Mode.SUBTRACT)
        with Locations((63.6722929489, 76.6204102079)):
            Circle(F31_R, mode=Mode.SUBTRACT)
    extrude(amount=F32_DEPTH)

    # F31 (on offset) → F33 (join)
    with BuildSketch(Plane.XY.offset(101)):
        Polygon((-46.5, 51), (-43.5, 51), (-43.5, 60), (-34.5, 60), (-34.5, 63), (-46.5, 63), align=None)
        Polygon((46.5, 51), (46.5, 63), (34.5, 63), (34.5, 60), (43.5, 60), (43.5, 51), align=None)
        Polygon((-46.5, -63), (-34.5, -63), (-34.5, -60), (-43.5, -60), (-43.5, -51), (-46.5, -51), align=None)
        Polygon((46.5, -51), (43.5, -51), (43.5, -60), (34.5, -60), (34.5, -63), (46.5, -63), align=None)
    extrude(amount=F33_DEPTH)


solid = Compound([f1.part, f32.part])
